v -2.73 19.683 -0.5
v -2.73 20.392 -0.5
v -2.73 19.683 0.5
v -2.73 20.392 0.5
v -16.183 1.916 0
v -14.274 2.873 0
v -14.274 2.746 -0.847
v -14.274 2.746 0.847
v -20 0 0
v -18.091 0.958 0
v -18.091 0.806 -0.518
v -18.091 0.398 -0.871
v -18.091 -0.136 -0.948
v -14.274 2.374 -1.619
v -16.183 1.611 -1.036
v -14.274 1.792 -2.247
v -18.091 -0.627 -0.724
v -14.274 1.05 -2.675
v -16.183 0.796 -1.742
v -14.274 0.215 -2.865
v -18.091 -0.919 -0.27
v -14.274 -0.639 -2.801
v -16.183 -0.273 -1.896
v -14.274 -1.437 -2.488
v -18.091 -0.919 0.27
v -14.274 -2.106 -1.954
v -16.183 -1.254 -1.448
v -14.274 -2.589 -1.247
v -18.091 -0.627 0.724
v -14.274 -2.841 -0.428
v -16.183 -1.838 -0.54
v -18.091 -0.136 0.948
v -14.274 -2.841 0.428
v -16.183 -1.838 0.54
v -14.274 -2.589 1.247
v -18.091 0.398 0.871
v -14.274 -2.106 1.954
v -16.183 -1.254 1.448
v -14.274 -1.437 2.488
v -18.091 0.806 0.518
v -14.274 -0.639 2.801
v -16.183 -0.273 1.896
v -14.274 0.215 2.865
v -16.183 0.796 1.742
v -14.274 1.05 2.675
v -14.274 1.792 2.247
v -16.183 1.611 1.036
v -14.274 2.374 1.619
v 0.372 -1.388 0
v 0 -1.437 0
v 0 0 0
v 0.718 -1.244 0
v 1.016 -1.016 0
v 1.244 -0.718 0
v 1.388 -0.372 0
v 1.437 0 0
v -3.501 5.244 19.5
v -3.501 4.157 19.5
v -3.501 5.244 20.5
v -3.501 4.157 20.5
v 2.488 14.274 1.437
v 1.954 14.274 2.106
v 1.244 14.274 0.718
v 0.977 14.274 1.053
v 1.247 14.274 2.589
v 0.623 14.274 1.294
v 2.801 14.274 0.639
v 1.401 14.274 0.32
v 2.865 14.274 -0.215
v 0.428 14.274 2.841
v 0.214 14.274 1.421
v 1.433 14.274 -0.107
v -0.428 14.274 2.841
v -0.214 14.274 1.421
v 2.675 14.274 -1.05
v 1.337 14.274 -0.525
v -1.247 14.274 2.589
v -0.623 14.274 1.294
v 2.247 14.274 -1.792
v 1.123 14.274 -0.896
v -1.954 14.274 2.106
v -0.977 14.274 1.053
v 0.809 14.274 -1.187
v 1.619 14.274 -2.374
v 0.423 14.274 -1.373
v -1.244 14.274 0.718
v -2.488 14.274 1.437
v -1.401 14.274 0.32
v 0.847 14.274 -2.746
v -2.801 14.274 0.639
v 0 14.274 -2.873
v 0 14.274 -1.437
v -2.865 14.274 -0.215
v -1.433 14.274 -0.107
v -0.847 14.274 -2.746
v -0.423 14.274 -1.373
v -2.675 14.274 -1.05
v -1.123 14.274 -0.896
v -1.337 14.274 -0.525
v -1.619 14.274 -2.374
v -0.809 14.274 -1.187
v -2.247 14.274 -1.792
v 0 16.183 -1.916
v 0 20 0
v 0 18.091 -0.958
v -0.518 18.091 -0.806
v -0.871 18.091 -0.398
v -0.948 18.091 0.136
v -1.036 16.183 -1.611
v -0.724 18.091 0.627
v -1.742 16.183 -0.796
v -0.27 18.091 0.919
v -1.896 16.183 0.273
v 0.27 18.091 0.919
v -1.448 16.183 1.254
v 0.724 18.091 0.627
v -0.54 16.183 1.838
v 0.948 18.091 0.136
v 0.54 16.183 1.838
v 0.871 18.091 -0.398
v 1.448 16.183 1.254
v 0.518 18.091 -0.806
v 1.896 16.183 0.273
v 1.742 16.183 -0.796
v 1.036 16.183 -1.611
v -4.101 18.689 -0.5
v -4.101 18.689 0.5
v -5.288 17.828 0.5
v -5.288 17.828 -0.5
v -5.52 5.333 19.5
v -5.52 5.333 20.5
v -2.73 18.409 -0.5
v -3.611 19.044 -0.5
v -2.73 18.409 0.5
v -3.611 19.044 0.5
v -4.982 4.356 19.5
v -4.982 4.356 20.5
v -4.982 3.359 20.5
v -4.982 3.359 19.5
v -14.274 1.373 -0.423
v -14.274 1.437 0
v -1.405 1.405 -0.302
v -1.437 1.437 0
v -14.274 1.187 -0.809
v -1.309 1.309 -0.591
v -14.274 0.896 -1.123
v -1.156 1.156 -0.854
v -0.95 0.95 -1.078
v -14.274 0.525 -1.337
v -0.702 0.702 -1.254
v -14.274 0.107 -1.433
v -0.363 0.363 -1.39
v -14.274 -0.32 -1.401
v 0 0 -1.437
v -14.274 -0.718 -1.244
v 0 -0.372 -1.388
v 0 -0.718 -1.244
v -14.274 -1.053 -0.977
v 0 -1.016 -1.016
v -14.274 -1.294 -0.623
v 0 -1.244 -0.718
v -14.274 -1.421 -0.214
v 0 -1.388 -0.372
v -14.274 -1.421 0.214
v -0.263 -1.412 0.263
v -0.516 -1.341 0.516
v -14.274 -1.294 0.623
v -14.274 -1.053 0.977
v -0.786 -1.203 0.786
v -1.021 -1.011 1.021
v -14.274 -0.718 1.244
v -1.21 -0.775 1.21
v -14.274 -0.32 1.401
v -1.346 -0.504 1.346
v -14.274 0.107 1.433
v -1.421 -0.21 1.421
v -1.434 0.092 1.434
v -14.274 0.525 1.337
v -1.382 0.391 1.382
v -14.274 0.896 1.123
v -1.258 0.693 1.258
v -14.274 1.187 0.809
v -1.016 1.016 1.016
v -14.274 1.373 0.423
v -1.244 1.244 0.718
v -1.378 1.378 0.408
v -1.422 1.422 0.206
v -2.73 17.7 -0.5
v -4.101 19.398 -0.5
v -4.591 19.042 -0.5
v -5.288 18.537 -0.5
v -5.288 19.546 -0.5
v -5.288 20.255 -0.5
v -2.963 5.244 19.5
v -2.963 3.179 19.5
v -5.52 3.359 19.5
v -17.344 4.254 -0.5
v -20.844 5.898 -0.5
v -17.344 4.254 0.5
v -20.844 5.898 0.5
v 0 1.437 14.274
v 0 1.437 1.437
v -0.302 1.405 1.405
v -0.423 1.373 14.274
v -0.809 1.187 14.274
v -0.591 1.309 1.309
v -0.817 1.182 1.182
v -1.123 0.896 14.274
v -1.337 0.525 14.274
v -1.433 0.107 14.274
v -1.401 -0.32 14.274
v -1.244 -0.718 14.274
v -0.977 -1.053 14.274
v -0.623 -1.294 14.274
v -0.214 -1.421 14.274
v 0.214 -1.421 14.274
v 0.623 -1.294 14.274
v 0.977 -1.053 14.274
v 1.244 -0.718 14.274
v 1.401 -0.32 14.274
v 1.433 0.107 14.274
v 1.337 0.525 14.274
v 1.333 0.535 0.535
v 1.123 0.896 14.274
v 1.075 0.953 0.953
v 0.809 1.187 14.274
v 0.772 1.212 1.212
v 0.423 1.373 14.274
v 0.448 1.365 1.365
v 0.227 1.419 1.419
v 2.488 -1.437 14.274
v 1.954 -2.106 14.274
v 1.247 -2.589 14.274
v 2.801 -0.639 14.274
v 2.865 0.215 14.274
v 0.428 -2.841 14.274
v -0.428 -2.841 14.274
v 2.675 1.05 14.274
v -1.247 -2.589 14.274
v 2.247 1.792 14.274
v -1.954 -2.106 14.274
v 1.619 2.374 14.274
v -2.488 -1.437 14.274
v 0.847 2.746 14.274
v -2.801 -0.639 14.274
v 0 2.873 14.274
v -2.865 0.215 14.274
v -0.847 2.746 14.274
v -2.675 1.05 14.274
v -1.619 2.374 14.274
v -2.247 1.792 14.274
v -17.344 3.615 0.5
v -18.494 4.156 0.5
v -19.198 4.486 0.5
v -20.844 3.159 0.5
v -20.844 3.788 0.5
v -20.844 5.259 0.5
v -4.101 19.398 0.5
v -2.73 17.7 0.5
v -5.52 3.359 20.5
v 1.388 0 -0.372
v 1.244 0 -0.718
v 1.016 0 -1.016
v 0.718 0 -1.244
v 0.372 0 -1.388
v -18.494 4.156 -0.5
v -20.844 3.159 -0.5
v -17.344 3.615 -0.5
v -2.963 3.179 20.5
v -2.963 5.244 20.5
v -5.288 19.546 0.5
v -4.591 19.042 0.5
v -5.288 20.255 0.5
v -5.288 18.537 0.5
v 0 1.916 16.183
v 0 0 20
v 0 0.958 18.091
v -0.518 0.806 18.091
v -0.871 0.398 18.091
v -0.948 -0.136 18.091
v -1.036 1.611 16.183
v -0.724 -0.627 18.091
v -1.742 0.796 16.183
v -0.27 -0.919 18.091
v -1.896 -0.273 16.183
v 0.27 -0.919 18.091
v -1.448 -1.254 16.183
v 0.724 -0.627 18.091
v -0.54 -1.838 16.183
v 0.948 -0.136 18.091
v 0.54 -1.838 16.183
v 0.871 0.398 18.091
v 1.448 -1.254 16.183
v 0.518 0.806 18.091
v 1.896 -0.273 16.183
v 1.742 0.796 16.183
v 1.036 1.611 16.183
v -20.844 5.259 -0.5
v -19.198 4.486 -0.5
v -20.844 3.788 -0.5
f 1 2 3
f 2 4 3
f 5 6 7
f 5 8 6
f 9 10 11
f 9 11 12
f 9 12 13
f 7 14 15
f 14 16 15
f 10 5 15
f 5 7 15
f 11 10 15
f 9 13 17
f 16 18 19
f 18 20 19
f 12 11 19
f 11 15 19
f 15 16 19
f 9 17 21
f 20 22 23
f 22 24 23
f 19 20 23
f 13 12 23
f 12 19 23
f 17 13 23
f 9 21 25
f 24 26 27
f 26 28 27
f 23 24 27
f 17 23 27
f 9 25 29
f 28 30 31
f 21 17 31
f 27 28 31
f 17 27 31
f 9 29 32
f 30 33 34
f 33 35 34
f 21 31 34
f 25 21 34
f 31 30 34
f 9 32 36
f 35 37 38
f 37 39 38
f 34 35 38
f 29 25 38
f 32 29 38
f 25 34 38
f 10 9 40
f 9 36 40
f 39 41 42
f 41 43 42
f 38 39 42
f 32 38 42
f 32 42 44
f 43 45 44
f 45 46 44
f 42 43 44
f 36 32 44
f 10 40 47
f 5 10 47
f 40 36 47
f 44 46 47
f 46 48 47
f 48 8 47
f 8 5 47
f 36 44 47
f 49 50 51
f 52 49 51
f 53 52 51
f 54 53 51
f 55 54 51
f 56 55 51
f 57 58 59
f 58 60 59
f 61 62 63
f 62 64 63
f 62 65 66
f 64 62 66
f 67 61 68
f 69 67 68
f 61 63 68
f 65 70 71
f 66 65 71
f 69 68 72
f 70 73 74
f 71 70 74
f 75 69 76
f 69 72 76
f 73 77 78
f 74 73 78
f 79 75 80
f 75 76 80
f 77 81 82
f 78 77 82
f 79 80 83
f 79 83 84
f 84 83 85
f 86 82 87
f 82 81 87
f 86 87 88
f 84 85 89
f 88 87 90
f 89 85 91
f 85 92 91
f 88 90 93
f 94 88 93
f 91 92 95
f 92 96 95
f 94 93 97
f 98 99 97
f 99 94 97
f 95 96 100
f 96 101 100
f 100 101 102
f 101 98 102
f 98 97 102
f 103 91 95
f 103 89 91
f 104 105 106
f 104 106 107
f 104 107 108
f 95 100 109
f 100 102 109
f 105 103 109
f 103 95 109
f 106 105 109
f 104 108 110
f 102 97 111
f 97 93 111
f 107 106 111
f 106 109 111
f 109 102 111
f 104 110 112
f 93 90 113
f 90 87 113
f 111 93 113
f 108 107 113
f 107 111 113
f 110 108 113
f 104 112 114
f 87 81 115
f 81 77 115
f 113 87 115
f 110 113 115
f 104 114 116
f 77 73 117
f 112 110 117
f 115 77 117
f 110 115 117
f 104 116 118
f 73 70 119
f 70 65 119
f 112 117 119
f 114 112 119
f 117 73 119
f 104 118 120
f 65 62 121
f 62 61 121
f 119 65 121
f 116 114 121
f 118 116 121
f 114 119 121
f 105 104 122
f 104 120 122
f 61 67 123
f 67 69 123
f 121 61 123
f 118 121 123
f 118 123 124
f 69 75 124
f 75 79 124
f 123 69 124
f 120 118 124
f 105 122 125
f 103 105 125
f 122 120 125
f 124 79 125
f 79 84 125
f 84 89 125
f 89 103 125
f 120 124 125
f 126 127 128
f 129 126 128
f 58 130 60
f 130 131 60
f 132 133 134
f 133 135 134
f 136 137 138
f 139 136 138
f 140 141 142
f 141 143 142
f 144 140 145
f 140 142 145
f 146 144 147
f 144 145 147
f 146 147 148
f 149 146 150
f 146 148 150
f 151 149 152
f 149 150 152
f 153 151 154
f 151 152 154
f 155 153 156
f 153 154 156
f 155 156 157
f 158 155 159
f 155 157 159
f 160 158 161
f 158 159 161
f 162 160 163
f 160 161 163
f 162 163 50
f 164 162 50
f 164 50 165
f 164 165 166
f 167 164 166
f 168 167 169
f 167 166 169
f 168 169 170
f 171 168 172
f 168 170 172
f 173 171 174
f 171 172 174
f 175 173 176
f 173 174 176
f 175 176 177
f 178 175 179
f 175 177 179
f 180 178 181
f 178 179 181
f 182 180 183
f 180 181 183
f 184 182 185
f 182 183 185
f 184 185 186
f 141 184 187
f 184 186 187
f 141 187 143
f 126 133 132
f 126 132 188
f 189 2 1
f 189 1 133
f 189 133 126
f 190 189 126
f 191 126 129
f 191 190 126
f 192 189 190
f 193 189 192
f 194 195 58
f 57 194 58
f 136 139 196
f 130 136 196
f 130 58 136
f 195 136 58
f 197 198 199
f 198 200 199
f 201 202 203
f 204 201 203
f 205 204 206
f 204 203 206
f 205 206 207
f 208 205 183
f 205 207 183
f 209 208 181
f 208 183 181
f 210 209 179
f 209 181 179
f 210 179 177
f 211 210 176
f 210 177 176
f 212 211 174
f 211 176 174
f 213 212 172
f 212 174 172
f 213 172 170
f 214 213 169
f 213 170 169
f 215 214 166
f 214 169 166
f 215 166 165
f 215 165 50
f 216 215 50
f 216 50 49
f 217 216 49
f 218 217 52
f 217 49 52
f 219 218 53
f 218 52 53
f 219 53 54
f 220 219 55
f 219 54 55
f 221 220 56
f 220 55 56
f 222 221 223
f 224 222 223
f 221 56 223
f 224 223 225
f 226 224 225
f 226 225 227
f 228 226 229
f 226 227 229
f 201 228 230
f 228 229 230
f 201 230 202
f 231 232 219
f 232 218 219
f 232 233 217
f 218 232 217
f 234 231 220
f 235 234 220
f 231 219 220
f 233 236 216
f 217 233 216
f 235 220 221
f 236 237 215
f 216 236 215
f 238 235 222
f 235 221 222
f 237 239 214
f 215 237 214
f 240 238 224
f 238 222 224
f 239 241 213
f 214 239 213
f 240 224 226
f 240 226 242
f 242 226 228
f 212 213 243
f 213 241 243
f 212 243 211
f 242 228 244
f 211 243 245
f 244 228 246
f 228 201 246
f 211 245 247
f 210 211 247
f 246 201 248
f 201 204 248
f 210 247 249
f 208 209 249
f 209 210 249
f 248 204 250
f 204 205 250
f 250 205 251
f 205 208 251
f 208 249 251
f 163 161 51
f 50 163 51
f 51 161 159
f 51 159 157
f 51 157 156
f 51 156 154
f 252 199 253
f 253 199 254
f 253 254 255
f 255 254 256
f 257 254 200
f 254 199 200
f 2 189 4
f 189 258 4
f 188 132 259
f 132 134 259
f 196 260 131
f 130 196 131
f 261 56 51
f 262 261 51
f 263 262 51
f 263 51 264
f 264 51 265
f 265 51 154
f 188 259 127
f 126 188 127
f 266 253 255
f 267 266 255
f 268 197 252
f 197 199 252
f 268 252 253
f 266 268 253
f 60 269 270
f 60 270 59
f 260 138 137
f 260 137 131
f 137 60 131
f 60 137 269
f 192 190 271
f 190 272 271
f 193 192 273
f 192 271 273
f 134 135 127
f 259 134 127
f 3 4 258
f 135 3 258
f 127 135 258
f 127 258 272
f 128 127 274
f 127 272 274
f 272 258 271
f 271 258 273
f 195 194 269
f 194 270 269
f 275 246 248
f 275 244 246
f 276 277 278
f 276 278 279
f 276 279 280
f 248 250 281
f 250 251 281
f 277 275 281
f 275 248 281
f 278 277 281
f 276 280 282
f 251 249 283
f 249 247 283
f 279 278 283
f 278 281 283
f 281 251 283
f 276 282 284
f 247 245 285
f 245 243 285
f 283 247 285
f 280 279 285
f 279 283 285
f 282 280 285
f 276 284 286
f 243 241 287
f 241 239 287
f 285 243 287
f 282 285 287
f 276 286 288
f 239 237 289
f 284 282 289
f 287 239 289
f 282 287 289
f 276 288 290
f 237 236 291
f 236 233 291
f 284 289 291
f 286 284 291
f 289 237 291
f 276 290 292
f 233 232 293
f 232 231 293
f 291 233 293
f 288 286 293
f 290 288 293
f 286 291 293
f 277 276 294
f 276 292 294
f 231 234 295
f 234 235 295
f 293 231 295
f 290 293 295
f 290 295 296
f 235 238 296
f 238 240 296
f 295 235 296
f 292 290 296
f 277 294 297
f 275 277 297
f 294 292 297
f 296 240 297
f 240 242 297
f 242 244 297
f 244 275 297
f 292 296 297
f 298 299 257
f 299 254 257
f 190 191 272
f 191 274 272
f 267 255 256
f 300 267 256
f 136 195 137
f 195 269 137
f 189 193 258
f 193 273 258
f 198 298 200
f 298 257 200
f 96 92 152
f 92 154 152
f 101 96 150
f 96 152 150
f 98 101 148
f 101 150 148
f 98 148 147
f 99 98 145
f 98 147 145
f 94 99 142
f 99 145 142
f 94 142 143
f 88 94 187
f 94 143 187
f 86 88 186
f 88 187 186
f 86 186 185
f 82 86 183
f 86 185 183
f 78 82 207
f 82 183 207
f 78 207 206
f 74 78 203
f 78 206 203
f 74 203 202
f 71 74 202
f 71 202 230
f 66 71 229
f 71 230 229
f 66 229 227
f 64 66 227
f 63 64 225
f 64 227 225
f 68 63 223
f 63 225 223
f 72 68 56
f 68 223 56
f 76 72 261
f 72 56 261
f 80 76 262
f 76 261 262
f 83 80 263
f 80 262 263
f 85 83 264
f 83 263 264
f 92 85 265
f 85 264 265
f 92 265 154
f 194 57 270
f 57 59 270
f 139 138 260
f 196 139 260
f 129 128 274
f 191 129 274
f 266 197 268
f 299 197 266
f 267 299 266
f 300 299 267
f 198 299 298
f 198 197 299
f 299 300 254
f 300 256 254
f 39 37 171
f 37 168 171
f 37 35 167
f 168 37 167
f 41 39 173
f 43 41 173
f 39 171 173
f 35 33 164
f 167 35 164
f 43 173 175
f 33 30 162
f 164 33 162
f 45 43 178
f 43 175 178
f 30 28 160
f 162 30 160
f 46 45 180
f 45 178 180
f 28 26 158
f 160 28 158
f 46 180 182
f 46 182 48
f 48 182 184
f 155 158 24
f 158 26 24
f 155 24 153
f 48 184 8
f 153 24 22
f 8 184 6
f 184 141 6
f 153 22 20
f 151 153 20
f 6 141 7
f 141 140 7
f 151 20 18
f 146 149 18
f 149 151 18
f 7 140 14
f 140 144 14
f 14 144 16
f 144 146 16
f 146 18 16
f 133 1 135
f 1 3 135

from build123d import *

# Parameters (mm, degrees)
BOSS_EXTRUDE2_DEPTH   = 0.5
BOSS_EXTRUDE2_2_DEPTH = 0.5
BOSS_EXTRUDE3_START   = 20
BOSS_EXTRUDE3_DEPTH   = 0.5


with BuildPart() as part:
    # Sketch1 → Revolve1 (revolve)
    with BuildSketch(Plane.XY, mode=Mode.PRIVATE) as revolve1_sk:
        Polygon((0, 0), (0, 20), (2.873386082, 14.274240536), (1.436693041, 14.274240536), (1.436693041, 0), align=None)
    revolve(revolve1_sk.sketch.rotate(Axis((0, 0, 0), (0, 1, 0)), 90), axis=Axis((0, 0, 0), (0, 1, 0)))

    # Sketch3 → Revolve2 (revolve)
    with BuildSketch(Plane.XY):
        Polygon((0, 0), (-20, 0), (-14.274240536, 2.873386082), (-14.274240536, 1.436693041), (0, 1.436693041), align=None)
    revolve(axis=Axis((0, 0, 0), (-1, 0, 0)))

    # Sketch5 → Revolve3 (revolve)
    with BuildSketch(Plane(origin=(0, 0, 0), x_dir=(0, 0, -1), z_dir=(1, 0, 0))):
        Polygon((0, 0), (-20, 0), (-14.274240536, 2.873386082), (-14.274240536, 1.436693041), (0, 1.436693041), align=None)
    revolve(axis=Axis((0, 0, 0), (0, 0, 1)))


with BuildPart() as body_2:
    # Sketch2 → Boss-Extrude2 (new, symmetric)
    with BuildSketch(Plane.XY):
        Polygon((-5.288177524, 17.828018559), (-5.288177524, 18.536852694), (-4.59126246, 19.042361508), (-5.288177524, 19.545766957), (-5.288177524, 20.254601091), (-4.101178325, 19.397830258), (-2.730485216, 20.392020963), (-2.730485216, 19.683186829), (-3.61109419, 19.044464873), (-2.730485216, 18.408547405), (-2.730485216, 17.699713271), (-4.101178325, 18.688996123), align=None)
    extrude(amount=BOSS_EXTRUDE2_DEPTH, both=True)


with BuildPart() as body_3:
    # Sketch2 → Boss-Extrude2 2 (new, symmetric)
    with BuildSketch(Plane.XY):
        Polygon((-20.843924957, 3.159236562), (-20.843924957, 3.788142812), (-19.198392105, 4.486460119), (-20.843924957, 5.259096337), (-20.843924957, 5.897818293), (-17.343924957, 4.253687684), (-17.343924957, 3.614965728), (-18.494465823, 4.155530632), align=None)
    extrude(amount=BOSS_EXTRUDE2_2_DEPTH, both=True)


with BuildPart() as body_4:
    # Sketch7 → Boss-Extrude3 (new, symmetric)
    with BuildSketch(Plane.XY.offset(BOSS_EXTRUDE3_START)):
        Polygon((-5.520264228, 3.358911797), (-5.520264228, 5.333270772), (-3.501033458, 4.1567884), (-3.501033458, 5.243527182), (-2.96257192, 5.243527182), (-2.96257192, 3.179424618), (-4.981802689, 4.35590699), (-4.981802689, 3.358911797), align=None)
    extrude(amount=BOSS_EXTRUDE3_DEPTH, both=True)


solid = Compound([part.part, body_2.part, body_3.part, body_4.part])
